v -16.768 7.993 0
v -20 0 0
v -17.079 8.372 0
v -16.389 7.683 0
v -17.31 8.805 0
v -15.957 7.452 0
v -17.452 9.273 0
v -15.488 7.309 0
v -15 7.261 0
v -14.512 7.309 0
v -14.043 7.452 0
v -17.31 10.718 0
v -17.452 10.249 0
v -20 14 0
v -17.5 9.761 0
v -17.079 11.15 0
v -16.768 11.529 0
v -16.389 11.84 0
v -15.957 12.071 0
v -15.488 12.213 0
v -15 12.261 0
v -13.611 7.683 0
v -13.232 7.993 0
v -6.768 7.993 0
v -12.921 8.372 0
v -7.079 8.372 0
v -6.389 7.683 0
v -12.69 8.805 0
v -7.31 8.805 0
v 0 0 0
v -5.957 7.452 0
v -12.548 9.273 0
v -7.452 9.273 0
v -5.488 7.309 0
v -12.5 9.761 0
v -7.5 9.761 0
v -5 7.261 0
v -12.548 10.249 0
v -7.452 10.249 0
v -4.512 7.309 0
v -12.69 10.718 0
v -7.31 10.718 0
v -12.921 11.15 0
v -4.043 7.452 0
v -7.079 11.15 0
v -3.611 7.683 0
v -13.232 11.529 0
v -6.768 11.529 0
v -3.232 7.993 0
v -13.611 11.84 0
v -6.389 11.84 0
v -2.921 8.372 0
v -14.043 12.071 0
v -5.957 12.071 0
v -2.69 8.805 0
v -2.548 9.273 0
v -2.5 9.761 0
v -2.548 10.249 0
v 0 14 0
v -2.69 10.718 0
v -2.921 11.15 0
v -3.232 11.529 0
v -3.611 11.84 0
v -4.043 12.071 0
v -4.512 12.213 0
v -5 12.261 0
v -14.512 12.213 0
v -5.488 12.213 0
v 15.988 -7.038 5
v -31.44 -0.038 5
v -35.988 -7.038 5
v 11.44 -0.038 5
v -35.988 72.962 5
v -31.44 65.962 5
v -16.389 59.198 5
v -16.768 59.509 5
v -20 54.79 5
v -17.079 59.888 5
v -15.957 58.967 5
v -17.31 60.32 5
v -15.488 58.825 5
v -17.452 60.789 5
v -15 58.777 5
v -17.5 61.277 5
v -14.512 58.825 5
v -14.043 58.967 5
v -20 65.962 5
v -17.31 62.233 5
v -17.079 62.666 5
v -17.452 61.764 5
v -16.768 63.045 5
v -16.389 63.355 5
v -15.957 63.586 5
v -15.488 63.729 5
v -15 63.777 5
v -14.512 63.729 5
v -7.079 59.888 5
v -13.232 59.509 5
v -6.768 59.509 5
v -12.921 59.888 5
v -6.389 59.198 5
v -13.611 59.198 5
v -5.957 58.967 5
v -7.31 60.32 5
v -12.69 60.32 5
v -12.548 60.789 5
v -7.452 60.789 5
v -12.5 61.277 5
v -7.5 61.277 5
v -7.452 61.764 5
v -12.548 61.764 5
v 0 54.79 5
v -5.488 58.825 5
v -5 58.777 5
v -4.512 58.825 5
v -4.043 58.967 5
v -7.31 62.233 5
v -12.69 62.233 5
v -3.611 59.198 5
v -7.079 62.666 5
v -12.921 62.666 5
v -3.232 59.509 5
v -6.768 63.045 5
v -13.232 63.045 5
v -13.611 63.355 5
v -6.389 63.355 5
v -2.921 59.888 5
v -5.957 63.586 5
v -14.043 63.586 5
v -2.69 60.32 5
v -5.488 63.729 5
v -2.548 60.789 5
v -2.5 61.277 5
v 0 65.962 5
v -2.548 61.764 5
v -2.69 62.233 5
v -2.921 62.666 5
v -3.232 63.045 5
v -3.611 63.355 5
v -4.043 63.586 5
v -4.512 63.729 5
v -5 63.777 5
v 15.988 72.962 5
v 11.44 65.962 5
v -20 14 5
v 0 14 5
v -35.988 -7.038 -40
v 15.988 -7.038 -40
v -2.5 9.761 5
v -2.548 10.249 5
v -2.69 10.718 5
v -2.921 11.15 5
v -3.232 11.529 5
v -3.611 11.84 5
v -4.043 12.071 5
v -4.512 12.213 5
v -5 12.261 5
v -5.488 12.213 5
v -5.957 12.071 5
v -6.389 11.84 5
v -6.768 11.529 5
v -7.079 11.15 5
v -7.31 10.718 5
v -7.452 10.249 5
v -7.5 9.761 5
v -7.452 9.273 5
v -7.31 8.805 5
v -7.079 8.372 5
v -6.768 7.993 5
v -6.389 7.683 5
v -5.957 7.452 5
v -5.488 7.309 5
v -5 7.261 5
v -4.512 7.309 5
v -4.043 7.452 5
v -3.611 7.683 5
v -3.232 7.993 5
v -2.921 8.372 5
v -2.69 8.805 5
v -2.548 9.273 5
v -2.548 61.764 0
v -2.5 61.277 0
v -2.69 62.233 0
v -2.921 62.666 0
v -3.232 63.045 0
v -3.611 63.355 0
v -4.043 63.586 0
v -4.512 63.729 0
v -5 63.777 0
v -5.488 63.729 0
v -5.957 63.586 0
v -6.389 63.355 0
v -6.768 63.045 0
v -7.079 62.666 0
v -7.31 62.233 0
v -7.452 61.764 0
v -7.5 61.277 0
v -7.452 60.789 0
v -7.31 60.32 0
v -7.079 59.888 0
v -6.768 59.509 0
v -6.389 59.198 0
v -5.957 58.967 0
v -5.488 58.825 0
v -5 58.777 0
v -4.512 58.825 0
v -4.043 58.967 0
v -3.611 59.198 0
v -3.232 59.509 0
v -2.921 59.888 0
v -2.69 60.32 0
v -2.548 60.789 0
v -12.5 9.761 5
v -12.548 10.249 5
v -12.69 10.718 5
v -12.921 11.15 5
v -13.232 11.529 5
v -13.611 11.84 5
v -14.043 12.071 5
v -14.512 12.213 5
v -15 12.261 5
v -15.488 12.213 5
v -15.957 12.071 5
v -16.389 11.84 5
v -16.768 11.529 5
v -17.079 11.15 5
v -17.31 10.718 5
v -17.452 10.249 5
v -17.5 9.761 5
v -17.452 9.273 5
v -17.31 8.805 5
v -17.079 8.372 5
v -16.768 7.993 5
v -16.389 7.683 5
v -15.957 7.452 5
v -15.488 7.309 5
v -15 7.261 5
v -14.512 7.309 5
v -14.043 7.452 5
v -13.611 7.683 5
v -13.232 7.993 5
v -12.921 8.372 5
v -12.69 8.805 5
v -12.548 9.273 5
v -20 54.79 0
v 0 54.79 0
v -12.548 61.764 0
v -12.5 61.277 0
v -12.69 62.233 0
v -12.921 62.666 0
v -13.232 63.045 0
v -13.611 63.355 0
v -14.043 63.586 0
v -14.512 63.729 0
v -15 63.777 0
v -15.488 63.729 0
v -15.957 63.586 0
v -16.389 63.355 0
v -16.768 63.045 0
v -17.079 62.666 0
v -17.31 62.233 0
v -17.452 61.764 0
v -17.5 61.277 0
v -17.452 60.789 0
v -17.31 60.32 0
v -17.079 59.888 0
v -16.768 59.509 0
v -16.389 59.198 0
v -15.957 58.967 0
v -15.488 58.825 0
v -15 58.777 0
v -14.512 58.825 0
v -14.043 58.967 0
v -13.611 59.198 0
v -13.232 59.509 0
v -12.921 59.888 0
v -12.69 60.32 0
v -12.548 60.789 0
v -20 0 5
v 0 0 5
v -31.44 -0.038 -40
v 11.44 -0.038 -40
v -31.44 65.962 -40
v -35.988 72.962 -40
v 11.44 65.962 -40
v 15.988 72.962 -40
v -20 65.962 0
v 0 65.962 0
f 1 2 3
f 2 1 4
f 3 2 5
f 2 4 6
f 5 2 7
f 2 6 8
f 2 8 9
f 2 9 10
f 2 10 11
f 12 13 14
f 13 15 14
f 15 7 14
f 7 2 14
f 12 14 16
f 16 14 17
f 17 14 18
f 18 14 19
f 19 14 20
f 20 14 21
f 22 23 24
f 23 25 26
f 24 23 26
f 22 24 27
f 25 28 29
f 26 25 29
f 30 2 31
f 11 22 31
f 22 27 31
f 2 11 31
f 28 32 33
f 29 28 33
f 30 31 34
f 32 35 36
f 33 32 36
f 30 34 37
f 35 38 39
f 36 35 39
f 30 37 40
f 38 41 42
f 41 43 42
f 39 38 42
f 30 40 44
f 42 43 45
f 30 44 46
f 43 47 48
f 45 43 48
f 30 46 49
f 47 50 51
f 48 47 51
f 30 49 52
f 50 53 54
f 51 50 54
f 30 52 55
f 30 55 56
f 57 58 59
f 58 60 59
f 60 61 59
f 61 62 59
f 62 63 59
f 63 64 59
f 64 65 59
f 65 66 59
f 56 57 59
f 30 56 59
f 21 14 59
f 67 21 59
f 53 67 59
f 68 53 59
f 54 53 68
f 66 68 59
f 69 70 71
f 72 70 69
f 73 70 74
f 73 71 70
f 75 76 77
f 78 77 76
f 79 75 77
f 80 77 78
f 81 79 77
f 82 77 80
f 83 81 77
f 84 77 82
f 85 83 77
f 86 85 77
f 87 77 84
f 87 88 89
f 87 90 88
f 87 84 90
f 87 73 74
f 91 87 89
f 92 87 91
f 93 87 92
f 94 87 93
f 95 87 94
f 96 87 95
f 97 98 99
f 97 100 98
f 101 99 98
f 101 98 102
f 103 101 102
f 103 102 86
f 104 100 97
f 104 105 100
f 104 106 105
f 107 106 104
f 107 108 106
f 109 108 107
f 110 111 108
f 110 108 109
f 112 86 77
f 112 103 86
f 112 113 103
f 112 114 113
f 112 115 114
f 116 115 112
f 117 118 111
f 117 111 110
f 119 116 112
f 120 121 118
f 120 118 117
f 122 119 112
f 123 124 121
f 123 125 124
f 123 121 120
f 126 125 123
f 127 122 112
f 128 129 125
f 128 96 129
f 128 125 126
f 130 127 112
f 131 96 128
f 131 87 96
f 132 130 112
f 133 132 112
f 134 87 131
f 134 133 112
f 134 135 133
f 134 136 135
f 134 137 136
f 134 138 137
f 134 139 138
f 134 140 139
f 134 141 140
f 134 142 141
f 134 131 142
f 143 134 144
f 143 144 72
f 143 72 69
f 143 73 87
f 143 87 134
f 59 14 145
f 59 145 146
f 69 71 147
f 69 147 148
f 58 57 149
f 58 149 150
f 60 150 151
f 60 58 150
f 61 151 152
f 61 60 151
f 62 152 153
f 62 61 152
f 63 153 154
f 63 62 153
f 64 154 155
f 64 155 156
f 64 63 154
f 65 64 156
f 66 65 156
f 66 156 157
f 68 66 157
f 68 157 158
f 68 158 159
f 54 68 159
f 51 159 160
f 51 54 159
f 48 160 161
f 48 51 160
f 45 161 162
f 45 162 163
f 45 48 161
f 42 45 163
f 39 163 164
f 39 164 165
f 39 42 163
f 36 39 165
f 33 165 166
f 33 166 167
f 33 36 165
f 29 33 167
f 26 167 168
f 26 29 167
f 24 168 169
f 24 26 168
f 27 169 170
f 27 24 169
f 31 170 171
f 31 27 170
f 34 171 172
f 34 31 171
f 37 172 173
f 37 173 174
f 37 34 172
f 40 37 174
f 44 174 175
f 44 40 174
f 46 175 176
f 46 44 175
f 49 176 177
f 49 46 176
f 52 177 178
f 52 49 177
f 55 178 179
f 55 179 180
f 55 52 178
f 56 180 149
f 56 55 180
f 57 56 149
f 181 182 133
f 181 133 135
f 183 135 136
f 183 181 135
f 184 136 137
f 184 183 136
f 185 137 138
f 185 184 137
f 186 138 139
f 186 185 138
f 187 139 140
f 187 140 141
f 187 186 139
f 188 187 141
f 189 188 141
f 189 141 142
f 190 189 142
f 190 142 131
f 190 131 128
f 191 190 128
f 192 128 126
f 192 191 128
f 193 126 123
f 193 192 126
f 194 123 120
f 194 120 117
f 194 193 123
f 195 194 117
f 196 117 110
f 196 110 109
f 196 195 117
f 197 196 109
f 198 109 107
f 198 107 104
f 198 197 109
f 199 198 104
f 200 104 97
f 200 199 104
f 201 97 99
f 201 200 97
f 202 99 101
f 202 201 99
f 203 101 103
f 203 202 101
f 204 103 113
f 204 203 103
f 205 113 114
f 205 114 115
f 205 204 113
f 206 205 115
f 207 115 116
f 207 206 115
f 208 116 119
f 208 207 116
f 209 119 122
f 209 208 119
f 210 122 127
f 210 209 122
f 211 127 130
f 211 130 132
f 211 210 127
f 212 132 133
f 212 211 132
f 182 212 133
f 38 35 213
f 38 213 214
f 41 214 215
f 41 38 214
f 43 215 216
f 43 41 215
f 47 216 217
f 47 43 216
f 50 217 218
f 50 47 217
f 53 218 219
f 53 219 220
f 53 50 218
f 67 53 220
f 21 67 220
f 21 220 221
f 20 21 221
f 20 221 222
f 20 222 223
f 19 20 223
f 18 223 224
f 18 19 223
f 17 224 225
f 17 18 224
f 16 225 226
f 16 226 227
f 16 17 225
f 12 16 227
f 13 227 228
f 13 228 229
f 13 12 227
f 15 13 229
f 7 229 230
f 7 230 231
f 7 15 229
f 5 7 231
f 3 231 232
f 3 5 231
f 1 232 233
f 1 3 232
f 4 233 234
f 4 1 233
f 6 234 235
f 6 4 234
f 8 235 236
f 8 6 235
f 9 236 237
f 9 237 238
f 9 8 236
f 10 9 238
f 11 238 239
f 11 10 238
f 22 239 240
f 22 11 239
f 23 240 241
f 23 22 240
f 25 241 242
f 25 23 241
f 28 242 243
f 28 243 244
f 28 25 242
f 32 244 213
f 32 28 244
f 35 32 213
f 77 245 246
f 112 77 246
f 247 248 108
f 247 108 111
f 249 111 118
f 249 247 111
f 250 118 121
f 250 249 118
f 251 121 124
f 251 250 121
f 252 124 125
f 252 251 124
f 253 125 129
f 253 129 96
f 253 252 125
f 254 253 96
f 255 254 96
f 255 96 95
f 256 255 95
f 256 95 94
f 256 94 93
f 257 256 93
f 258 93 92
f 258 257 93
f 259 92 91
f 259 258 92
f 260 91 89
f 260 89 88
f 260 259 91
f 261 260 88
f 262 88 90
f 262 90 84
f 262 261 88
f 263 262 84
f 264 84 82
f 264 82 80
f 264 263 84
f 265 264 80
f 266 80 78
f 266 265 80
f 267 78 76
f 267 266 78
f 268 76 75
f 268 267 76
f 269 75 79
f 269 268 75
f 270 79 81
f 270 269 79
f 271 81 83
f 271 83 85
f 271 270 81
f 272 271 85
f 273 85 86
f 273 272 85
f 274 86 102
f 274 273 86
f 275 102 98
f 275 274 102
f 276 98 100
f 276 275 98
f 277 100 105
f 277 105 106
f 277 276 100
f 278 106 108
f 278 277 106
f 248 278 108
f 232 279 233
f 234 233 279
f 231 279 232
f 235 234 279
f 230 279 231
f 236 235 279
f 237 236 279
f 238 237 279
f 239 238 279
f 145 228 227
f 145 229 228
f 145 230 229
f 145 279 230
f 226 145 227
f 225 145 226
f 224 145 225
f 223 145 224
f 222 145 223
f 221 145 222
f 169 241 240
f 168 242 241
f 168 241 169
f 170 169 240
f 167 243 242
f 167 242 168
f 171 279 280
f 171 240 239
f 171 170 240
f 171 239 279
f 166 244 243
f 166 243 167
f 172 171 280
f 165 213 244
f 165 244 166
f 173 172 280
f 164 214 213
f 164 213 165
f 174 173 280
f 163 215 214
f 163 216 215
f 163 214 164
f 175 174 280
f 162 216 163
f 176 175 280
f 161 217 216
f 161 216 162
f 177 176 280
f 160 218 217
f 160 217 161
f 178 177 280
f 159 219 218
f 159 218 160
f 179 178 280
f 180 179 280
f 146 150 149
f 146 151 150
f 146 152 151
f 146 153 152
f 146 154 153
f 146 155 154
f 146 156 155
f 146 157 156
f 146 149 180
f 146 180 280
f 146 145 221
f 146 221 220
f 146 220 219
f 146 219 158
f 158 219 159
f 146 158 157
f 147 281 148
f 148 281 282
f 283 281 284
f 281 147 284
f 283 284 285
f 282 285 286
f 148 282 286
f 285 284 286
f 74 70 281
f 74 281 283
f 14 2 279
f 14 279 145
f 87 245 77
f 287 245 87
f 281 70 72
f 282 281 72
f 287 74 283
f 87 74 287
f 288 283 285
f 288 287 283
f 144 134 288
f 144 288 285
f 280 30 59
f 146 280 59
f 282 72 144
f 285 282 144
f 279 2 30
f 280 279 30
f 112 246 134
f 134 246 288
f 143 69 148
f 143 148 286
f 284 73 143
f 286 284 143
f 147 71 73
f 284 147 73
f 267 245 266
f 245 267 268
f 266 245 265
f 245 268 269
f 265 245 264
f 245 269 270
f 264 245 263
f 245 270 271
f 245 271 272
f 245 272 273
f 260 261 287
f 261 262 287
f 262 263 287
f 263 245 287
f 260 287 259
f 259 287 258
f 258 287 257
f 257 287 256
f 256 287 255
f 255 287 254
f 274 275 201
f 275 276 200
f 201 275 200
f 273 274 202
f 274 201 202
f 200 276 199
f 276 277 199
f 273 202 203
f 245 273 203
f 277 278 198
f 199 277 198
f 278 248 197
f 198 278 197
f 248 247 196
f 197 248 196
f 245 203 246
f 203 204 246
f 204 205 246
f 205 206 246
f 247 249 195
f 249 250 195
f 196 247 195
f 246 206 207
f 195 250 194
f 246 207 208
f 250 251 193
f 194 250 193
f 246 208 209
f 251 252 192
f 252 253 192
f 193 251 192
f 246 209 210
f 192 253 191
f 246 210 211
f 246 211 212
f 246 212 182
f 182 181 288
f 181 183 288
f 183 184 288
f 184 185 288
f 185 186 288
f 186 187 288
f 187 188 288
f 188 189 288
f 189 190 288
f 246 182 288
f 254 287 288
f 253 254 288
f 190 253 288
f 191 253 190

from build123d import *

# Parameters (mm, degrees)
SKIZZE1_W                         = 20
SKIZZE1_H                         = 11.18
SKIZZE1_R                         = 2.5
AUFSATZ_LINEAR_AUSTRAGEN1_DEPTH   = 5
SKIZZE1_H_2                       = 14
AUFSATZ_LINEAR_AUSTRAGEN1_2_DEPTH = 5
SKIZZE3_W                         = 51.975705294
SKIZZE3_H                         = 80
SKIZZE3_W_2                       = 42.879956868
SKIZZE3_H_2                       = 66
AUFSATZ_LINEAR_AUSTRAGEN2_DEPTH   = 45


with BuildPart() as part:
    # Skizze1 → Aufsatz-Linear austragen1 (new body)
    with BuildSketch(Plane.XY):
        with Locations((-10, 60.38)):
            Rectangle(SKIZZE1_W, SKIZZE1_H)
        with Locations((-15, 61.276751707)):
            Circle(SKIZZE1_R, mode=Mode.SUBTRACT)
        with Locations((-5, 61.276751707)):
            Circle(SKIZZE1_R, mode=Mode.SUBTRACT)
    extrude(amount=AUFSATZ_LINEAR_AUSTRAGEN1_DEPTH)

    # Skizze3 → Aufsatz-Linear austragen2 (add)
    with BuildSketch(Plane.XY.offset(5)):
        with Locations((-10, 32.961965548)):
            Rectangle(SKIZZE3_W, SKIZZE3_H)
        with Locations((-10, 32.961965548)):
            Rectangle(SKIZZE3_W_2, SKIZZE3_H_2, mode=Mode.SUBTRACT)
    extrude(amount=-AUFSATZ_LINEAR_AUSTRAGEN2_DEPTH)


with BuildPart() as body_2:
    # Skizze1 → Aufsatz-Linear austragen1 2 (new body)
    with BuildSketch(Plane.XY):
        with Locations((-10, 7)):
            Rectangle(SKIZZE1_W, SKIZZE1_H_2)
        with Locations((-15, 9.761216808)):
            Circle(SKIZZE1_R, mode=Mode.SUBTRACT)
        with Locations((-5, 9.761216808)):
            Circle(SKIZZE1_R, mode=Mode.SUBTRACT)
    extrude(amount=AUFSATZ_LINEAR_AUSTRAGEN1_2_DEPTH)


solid = Compound([part.part, body_2.part])
